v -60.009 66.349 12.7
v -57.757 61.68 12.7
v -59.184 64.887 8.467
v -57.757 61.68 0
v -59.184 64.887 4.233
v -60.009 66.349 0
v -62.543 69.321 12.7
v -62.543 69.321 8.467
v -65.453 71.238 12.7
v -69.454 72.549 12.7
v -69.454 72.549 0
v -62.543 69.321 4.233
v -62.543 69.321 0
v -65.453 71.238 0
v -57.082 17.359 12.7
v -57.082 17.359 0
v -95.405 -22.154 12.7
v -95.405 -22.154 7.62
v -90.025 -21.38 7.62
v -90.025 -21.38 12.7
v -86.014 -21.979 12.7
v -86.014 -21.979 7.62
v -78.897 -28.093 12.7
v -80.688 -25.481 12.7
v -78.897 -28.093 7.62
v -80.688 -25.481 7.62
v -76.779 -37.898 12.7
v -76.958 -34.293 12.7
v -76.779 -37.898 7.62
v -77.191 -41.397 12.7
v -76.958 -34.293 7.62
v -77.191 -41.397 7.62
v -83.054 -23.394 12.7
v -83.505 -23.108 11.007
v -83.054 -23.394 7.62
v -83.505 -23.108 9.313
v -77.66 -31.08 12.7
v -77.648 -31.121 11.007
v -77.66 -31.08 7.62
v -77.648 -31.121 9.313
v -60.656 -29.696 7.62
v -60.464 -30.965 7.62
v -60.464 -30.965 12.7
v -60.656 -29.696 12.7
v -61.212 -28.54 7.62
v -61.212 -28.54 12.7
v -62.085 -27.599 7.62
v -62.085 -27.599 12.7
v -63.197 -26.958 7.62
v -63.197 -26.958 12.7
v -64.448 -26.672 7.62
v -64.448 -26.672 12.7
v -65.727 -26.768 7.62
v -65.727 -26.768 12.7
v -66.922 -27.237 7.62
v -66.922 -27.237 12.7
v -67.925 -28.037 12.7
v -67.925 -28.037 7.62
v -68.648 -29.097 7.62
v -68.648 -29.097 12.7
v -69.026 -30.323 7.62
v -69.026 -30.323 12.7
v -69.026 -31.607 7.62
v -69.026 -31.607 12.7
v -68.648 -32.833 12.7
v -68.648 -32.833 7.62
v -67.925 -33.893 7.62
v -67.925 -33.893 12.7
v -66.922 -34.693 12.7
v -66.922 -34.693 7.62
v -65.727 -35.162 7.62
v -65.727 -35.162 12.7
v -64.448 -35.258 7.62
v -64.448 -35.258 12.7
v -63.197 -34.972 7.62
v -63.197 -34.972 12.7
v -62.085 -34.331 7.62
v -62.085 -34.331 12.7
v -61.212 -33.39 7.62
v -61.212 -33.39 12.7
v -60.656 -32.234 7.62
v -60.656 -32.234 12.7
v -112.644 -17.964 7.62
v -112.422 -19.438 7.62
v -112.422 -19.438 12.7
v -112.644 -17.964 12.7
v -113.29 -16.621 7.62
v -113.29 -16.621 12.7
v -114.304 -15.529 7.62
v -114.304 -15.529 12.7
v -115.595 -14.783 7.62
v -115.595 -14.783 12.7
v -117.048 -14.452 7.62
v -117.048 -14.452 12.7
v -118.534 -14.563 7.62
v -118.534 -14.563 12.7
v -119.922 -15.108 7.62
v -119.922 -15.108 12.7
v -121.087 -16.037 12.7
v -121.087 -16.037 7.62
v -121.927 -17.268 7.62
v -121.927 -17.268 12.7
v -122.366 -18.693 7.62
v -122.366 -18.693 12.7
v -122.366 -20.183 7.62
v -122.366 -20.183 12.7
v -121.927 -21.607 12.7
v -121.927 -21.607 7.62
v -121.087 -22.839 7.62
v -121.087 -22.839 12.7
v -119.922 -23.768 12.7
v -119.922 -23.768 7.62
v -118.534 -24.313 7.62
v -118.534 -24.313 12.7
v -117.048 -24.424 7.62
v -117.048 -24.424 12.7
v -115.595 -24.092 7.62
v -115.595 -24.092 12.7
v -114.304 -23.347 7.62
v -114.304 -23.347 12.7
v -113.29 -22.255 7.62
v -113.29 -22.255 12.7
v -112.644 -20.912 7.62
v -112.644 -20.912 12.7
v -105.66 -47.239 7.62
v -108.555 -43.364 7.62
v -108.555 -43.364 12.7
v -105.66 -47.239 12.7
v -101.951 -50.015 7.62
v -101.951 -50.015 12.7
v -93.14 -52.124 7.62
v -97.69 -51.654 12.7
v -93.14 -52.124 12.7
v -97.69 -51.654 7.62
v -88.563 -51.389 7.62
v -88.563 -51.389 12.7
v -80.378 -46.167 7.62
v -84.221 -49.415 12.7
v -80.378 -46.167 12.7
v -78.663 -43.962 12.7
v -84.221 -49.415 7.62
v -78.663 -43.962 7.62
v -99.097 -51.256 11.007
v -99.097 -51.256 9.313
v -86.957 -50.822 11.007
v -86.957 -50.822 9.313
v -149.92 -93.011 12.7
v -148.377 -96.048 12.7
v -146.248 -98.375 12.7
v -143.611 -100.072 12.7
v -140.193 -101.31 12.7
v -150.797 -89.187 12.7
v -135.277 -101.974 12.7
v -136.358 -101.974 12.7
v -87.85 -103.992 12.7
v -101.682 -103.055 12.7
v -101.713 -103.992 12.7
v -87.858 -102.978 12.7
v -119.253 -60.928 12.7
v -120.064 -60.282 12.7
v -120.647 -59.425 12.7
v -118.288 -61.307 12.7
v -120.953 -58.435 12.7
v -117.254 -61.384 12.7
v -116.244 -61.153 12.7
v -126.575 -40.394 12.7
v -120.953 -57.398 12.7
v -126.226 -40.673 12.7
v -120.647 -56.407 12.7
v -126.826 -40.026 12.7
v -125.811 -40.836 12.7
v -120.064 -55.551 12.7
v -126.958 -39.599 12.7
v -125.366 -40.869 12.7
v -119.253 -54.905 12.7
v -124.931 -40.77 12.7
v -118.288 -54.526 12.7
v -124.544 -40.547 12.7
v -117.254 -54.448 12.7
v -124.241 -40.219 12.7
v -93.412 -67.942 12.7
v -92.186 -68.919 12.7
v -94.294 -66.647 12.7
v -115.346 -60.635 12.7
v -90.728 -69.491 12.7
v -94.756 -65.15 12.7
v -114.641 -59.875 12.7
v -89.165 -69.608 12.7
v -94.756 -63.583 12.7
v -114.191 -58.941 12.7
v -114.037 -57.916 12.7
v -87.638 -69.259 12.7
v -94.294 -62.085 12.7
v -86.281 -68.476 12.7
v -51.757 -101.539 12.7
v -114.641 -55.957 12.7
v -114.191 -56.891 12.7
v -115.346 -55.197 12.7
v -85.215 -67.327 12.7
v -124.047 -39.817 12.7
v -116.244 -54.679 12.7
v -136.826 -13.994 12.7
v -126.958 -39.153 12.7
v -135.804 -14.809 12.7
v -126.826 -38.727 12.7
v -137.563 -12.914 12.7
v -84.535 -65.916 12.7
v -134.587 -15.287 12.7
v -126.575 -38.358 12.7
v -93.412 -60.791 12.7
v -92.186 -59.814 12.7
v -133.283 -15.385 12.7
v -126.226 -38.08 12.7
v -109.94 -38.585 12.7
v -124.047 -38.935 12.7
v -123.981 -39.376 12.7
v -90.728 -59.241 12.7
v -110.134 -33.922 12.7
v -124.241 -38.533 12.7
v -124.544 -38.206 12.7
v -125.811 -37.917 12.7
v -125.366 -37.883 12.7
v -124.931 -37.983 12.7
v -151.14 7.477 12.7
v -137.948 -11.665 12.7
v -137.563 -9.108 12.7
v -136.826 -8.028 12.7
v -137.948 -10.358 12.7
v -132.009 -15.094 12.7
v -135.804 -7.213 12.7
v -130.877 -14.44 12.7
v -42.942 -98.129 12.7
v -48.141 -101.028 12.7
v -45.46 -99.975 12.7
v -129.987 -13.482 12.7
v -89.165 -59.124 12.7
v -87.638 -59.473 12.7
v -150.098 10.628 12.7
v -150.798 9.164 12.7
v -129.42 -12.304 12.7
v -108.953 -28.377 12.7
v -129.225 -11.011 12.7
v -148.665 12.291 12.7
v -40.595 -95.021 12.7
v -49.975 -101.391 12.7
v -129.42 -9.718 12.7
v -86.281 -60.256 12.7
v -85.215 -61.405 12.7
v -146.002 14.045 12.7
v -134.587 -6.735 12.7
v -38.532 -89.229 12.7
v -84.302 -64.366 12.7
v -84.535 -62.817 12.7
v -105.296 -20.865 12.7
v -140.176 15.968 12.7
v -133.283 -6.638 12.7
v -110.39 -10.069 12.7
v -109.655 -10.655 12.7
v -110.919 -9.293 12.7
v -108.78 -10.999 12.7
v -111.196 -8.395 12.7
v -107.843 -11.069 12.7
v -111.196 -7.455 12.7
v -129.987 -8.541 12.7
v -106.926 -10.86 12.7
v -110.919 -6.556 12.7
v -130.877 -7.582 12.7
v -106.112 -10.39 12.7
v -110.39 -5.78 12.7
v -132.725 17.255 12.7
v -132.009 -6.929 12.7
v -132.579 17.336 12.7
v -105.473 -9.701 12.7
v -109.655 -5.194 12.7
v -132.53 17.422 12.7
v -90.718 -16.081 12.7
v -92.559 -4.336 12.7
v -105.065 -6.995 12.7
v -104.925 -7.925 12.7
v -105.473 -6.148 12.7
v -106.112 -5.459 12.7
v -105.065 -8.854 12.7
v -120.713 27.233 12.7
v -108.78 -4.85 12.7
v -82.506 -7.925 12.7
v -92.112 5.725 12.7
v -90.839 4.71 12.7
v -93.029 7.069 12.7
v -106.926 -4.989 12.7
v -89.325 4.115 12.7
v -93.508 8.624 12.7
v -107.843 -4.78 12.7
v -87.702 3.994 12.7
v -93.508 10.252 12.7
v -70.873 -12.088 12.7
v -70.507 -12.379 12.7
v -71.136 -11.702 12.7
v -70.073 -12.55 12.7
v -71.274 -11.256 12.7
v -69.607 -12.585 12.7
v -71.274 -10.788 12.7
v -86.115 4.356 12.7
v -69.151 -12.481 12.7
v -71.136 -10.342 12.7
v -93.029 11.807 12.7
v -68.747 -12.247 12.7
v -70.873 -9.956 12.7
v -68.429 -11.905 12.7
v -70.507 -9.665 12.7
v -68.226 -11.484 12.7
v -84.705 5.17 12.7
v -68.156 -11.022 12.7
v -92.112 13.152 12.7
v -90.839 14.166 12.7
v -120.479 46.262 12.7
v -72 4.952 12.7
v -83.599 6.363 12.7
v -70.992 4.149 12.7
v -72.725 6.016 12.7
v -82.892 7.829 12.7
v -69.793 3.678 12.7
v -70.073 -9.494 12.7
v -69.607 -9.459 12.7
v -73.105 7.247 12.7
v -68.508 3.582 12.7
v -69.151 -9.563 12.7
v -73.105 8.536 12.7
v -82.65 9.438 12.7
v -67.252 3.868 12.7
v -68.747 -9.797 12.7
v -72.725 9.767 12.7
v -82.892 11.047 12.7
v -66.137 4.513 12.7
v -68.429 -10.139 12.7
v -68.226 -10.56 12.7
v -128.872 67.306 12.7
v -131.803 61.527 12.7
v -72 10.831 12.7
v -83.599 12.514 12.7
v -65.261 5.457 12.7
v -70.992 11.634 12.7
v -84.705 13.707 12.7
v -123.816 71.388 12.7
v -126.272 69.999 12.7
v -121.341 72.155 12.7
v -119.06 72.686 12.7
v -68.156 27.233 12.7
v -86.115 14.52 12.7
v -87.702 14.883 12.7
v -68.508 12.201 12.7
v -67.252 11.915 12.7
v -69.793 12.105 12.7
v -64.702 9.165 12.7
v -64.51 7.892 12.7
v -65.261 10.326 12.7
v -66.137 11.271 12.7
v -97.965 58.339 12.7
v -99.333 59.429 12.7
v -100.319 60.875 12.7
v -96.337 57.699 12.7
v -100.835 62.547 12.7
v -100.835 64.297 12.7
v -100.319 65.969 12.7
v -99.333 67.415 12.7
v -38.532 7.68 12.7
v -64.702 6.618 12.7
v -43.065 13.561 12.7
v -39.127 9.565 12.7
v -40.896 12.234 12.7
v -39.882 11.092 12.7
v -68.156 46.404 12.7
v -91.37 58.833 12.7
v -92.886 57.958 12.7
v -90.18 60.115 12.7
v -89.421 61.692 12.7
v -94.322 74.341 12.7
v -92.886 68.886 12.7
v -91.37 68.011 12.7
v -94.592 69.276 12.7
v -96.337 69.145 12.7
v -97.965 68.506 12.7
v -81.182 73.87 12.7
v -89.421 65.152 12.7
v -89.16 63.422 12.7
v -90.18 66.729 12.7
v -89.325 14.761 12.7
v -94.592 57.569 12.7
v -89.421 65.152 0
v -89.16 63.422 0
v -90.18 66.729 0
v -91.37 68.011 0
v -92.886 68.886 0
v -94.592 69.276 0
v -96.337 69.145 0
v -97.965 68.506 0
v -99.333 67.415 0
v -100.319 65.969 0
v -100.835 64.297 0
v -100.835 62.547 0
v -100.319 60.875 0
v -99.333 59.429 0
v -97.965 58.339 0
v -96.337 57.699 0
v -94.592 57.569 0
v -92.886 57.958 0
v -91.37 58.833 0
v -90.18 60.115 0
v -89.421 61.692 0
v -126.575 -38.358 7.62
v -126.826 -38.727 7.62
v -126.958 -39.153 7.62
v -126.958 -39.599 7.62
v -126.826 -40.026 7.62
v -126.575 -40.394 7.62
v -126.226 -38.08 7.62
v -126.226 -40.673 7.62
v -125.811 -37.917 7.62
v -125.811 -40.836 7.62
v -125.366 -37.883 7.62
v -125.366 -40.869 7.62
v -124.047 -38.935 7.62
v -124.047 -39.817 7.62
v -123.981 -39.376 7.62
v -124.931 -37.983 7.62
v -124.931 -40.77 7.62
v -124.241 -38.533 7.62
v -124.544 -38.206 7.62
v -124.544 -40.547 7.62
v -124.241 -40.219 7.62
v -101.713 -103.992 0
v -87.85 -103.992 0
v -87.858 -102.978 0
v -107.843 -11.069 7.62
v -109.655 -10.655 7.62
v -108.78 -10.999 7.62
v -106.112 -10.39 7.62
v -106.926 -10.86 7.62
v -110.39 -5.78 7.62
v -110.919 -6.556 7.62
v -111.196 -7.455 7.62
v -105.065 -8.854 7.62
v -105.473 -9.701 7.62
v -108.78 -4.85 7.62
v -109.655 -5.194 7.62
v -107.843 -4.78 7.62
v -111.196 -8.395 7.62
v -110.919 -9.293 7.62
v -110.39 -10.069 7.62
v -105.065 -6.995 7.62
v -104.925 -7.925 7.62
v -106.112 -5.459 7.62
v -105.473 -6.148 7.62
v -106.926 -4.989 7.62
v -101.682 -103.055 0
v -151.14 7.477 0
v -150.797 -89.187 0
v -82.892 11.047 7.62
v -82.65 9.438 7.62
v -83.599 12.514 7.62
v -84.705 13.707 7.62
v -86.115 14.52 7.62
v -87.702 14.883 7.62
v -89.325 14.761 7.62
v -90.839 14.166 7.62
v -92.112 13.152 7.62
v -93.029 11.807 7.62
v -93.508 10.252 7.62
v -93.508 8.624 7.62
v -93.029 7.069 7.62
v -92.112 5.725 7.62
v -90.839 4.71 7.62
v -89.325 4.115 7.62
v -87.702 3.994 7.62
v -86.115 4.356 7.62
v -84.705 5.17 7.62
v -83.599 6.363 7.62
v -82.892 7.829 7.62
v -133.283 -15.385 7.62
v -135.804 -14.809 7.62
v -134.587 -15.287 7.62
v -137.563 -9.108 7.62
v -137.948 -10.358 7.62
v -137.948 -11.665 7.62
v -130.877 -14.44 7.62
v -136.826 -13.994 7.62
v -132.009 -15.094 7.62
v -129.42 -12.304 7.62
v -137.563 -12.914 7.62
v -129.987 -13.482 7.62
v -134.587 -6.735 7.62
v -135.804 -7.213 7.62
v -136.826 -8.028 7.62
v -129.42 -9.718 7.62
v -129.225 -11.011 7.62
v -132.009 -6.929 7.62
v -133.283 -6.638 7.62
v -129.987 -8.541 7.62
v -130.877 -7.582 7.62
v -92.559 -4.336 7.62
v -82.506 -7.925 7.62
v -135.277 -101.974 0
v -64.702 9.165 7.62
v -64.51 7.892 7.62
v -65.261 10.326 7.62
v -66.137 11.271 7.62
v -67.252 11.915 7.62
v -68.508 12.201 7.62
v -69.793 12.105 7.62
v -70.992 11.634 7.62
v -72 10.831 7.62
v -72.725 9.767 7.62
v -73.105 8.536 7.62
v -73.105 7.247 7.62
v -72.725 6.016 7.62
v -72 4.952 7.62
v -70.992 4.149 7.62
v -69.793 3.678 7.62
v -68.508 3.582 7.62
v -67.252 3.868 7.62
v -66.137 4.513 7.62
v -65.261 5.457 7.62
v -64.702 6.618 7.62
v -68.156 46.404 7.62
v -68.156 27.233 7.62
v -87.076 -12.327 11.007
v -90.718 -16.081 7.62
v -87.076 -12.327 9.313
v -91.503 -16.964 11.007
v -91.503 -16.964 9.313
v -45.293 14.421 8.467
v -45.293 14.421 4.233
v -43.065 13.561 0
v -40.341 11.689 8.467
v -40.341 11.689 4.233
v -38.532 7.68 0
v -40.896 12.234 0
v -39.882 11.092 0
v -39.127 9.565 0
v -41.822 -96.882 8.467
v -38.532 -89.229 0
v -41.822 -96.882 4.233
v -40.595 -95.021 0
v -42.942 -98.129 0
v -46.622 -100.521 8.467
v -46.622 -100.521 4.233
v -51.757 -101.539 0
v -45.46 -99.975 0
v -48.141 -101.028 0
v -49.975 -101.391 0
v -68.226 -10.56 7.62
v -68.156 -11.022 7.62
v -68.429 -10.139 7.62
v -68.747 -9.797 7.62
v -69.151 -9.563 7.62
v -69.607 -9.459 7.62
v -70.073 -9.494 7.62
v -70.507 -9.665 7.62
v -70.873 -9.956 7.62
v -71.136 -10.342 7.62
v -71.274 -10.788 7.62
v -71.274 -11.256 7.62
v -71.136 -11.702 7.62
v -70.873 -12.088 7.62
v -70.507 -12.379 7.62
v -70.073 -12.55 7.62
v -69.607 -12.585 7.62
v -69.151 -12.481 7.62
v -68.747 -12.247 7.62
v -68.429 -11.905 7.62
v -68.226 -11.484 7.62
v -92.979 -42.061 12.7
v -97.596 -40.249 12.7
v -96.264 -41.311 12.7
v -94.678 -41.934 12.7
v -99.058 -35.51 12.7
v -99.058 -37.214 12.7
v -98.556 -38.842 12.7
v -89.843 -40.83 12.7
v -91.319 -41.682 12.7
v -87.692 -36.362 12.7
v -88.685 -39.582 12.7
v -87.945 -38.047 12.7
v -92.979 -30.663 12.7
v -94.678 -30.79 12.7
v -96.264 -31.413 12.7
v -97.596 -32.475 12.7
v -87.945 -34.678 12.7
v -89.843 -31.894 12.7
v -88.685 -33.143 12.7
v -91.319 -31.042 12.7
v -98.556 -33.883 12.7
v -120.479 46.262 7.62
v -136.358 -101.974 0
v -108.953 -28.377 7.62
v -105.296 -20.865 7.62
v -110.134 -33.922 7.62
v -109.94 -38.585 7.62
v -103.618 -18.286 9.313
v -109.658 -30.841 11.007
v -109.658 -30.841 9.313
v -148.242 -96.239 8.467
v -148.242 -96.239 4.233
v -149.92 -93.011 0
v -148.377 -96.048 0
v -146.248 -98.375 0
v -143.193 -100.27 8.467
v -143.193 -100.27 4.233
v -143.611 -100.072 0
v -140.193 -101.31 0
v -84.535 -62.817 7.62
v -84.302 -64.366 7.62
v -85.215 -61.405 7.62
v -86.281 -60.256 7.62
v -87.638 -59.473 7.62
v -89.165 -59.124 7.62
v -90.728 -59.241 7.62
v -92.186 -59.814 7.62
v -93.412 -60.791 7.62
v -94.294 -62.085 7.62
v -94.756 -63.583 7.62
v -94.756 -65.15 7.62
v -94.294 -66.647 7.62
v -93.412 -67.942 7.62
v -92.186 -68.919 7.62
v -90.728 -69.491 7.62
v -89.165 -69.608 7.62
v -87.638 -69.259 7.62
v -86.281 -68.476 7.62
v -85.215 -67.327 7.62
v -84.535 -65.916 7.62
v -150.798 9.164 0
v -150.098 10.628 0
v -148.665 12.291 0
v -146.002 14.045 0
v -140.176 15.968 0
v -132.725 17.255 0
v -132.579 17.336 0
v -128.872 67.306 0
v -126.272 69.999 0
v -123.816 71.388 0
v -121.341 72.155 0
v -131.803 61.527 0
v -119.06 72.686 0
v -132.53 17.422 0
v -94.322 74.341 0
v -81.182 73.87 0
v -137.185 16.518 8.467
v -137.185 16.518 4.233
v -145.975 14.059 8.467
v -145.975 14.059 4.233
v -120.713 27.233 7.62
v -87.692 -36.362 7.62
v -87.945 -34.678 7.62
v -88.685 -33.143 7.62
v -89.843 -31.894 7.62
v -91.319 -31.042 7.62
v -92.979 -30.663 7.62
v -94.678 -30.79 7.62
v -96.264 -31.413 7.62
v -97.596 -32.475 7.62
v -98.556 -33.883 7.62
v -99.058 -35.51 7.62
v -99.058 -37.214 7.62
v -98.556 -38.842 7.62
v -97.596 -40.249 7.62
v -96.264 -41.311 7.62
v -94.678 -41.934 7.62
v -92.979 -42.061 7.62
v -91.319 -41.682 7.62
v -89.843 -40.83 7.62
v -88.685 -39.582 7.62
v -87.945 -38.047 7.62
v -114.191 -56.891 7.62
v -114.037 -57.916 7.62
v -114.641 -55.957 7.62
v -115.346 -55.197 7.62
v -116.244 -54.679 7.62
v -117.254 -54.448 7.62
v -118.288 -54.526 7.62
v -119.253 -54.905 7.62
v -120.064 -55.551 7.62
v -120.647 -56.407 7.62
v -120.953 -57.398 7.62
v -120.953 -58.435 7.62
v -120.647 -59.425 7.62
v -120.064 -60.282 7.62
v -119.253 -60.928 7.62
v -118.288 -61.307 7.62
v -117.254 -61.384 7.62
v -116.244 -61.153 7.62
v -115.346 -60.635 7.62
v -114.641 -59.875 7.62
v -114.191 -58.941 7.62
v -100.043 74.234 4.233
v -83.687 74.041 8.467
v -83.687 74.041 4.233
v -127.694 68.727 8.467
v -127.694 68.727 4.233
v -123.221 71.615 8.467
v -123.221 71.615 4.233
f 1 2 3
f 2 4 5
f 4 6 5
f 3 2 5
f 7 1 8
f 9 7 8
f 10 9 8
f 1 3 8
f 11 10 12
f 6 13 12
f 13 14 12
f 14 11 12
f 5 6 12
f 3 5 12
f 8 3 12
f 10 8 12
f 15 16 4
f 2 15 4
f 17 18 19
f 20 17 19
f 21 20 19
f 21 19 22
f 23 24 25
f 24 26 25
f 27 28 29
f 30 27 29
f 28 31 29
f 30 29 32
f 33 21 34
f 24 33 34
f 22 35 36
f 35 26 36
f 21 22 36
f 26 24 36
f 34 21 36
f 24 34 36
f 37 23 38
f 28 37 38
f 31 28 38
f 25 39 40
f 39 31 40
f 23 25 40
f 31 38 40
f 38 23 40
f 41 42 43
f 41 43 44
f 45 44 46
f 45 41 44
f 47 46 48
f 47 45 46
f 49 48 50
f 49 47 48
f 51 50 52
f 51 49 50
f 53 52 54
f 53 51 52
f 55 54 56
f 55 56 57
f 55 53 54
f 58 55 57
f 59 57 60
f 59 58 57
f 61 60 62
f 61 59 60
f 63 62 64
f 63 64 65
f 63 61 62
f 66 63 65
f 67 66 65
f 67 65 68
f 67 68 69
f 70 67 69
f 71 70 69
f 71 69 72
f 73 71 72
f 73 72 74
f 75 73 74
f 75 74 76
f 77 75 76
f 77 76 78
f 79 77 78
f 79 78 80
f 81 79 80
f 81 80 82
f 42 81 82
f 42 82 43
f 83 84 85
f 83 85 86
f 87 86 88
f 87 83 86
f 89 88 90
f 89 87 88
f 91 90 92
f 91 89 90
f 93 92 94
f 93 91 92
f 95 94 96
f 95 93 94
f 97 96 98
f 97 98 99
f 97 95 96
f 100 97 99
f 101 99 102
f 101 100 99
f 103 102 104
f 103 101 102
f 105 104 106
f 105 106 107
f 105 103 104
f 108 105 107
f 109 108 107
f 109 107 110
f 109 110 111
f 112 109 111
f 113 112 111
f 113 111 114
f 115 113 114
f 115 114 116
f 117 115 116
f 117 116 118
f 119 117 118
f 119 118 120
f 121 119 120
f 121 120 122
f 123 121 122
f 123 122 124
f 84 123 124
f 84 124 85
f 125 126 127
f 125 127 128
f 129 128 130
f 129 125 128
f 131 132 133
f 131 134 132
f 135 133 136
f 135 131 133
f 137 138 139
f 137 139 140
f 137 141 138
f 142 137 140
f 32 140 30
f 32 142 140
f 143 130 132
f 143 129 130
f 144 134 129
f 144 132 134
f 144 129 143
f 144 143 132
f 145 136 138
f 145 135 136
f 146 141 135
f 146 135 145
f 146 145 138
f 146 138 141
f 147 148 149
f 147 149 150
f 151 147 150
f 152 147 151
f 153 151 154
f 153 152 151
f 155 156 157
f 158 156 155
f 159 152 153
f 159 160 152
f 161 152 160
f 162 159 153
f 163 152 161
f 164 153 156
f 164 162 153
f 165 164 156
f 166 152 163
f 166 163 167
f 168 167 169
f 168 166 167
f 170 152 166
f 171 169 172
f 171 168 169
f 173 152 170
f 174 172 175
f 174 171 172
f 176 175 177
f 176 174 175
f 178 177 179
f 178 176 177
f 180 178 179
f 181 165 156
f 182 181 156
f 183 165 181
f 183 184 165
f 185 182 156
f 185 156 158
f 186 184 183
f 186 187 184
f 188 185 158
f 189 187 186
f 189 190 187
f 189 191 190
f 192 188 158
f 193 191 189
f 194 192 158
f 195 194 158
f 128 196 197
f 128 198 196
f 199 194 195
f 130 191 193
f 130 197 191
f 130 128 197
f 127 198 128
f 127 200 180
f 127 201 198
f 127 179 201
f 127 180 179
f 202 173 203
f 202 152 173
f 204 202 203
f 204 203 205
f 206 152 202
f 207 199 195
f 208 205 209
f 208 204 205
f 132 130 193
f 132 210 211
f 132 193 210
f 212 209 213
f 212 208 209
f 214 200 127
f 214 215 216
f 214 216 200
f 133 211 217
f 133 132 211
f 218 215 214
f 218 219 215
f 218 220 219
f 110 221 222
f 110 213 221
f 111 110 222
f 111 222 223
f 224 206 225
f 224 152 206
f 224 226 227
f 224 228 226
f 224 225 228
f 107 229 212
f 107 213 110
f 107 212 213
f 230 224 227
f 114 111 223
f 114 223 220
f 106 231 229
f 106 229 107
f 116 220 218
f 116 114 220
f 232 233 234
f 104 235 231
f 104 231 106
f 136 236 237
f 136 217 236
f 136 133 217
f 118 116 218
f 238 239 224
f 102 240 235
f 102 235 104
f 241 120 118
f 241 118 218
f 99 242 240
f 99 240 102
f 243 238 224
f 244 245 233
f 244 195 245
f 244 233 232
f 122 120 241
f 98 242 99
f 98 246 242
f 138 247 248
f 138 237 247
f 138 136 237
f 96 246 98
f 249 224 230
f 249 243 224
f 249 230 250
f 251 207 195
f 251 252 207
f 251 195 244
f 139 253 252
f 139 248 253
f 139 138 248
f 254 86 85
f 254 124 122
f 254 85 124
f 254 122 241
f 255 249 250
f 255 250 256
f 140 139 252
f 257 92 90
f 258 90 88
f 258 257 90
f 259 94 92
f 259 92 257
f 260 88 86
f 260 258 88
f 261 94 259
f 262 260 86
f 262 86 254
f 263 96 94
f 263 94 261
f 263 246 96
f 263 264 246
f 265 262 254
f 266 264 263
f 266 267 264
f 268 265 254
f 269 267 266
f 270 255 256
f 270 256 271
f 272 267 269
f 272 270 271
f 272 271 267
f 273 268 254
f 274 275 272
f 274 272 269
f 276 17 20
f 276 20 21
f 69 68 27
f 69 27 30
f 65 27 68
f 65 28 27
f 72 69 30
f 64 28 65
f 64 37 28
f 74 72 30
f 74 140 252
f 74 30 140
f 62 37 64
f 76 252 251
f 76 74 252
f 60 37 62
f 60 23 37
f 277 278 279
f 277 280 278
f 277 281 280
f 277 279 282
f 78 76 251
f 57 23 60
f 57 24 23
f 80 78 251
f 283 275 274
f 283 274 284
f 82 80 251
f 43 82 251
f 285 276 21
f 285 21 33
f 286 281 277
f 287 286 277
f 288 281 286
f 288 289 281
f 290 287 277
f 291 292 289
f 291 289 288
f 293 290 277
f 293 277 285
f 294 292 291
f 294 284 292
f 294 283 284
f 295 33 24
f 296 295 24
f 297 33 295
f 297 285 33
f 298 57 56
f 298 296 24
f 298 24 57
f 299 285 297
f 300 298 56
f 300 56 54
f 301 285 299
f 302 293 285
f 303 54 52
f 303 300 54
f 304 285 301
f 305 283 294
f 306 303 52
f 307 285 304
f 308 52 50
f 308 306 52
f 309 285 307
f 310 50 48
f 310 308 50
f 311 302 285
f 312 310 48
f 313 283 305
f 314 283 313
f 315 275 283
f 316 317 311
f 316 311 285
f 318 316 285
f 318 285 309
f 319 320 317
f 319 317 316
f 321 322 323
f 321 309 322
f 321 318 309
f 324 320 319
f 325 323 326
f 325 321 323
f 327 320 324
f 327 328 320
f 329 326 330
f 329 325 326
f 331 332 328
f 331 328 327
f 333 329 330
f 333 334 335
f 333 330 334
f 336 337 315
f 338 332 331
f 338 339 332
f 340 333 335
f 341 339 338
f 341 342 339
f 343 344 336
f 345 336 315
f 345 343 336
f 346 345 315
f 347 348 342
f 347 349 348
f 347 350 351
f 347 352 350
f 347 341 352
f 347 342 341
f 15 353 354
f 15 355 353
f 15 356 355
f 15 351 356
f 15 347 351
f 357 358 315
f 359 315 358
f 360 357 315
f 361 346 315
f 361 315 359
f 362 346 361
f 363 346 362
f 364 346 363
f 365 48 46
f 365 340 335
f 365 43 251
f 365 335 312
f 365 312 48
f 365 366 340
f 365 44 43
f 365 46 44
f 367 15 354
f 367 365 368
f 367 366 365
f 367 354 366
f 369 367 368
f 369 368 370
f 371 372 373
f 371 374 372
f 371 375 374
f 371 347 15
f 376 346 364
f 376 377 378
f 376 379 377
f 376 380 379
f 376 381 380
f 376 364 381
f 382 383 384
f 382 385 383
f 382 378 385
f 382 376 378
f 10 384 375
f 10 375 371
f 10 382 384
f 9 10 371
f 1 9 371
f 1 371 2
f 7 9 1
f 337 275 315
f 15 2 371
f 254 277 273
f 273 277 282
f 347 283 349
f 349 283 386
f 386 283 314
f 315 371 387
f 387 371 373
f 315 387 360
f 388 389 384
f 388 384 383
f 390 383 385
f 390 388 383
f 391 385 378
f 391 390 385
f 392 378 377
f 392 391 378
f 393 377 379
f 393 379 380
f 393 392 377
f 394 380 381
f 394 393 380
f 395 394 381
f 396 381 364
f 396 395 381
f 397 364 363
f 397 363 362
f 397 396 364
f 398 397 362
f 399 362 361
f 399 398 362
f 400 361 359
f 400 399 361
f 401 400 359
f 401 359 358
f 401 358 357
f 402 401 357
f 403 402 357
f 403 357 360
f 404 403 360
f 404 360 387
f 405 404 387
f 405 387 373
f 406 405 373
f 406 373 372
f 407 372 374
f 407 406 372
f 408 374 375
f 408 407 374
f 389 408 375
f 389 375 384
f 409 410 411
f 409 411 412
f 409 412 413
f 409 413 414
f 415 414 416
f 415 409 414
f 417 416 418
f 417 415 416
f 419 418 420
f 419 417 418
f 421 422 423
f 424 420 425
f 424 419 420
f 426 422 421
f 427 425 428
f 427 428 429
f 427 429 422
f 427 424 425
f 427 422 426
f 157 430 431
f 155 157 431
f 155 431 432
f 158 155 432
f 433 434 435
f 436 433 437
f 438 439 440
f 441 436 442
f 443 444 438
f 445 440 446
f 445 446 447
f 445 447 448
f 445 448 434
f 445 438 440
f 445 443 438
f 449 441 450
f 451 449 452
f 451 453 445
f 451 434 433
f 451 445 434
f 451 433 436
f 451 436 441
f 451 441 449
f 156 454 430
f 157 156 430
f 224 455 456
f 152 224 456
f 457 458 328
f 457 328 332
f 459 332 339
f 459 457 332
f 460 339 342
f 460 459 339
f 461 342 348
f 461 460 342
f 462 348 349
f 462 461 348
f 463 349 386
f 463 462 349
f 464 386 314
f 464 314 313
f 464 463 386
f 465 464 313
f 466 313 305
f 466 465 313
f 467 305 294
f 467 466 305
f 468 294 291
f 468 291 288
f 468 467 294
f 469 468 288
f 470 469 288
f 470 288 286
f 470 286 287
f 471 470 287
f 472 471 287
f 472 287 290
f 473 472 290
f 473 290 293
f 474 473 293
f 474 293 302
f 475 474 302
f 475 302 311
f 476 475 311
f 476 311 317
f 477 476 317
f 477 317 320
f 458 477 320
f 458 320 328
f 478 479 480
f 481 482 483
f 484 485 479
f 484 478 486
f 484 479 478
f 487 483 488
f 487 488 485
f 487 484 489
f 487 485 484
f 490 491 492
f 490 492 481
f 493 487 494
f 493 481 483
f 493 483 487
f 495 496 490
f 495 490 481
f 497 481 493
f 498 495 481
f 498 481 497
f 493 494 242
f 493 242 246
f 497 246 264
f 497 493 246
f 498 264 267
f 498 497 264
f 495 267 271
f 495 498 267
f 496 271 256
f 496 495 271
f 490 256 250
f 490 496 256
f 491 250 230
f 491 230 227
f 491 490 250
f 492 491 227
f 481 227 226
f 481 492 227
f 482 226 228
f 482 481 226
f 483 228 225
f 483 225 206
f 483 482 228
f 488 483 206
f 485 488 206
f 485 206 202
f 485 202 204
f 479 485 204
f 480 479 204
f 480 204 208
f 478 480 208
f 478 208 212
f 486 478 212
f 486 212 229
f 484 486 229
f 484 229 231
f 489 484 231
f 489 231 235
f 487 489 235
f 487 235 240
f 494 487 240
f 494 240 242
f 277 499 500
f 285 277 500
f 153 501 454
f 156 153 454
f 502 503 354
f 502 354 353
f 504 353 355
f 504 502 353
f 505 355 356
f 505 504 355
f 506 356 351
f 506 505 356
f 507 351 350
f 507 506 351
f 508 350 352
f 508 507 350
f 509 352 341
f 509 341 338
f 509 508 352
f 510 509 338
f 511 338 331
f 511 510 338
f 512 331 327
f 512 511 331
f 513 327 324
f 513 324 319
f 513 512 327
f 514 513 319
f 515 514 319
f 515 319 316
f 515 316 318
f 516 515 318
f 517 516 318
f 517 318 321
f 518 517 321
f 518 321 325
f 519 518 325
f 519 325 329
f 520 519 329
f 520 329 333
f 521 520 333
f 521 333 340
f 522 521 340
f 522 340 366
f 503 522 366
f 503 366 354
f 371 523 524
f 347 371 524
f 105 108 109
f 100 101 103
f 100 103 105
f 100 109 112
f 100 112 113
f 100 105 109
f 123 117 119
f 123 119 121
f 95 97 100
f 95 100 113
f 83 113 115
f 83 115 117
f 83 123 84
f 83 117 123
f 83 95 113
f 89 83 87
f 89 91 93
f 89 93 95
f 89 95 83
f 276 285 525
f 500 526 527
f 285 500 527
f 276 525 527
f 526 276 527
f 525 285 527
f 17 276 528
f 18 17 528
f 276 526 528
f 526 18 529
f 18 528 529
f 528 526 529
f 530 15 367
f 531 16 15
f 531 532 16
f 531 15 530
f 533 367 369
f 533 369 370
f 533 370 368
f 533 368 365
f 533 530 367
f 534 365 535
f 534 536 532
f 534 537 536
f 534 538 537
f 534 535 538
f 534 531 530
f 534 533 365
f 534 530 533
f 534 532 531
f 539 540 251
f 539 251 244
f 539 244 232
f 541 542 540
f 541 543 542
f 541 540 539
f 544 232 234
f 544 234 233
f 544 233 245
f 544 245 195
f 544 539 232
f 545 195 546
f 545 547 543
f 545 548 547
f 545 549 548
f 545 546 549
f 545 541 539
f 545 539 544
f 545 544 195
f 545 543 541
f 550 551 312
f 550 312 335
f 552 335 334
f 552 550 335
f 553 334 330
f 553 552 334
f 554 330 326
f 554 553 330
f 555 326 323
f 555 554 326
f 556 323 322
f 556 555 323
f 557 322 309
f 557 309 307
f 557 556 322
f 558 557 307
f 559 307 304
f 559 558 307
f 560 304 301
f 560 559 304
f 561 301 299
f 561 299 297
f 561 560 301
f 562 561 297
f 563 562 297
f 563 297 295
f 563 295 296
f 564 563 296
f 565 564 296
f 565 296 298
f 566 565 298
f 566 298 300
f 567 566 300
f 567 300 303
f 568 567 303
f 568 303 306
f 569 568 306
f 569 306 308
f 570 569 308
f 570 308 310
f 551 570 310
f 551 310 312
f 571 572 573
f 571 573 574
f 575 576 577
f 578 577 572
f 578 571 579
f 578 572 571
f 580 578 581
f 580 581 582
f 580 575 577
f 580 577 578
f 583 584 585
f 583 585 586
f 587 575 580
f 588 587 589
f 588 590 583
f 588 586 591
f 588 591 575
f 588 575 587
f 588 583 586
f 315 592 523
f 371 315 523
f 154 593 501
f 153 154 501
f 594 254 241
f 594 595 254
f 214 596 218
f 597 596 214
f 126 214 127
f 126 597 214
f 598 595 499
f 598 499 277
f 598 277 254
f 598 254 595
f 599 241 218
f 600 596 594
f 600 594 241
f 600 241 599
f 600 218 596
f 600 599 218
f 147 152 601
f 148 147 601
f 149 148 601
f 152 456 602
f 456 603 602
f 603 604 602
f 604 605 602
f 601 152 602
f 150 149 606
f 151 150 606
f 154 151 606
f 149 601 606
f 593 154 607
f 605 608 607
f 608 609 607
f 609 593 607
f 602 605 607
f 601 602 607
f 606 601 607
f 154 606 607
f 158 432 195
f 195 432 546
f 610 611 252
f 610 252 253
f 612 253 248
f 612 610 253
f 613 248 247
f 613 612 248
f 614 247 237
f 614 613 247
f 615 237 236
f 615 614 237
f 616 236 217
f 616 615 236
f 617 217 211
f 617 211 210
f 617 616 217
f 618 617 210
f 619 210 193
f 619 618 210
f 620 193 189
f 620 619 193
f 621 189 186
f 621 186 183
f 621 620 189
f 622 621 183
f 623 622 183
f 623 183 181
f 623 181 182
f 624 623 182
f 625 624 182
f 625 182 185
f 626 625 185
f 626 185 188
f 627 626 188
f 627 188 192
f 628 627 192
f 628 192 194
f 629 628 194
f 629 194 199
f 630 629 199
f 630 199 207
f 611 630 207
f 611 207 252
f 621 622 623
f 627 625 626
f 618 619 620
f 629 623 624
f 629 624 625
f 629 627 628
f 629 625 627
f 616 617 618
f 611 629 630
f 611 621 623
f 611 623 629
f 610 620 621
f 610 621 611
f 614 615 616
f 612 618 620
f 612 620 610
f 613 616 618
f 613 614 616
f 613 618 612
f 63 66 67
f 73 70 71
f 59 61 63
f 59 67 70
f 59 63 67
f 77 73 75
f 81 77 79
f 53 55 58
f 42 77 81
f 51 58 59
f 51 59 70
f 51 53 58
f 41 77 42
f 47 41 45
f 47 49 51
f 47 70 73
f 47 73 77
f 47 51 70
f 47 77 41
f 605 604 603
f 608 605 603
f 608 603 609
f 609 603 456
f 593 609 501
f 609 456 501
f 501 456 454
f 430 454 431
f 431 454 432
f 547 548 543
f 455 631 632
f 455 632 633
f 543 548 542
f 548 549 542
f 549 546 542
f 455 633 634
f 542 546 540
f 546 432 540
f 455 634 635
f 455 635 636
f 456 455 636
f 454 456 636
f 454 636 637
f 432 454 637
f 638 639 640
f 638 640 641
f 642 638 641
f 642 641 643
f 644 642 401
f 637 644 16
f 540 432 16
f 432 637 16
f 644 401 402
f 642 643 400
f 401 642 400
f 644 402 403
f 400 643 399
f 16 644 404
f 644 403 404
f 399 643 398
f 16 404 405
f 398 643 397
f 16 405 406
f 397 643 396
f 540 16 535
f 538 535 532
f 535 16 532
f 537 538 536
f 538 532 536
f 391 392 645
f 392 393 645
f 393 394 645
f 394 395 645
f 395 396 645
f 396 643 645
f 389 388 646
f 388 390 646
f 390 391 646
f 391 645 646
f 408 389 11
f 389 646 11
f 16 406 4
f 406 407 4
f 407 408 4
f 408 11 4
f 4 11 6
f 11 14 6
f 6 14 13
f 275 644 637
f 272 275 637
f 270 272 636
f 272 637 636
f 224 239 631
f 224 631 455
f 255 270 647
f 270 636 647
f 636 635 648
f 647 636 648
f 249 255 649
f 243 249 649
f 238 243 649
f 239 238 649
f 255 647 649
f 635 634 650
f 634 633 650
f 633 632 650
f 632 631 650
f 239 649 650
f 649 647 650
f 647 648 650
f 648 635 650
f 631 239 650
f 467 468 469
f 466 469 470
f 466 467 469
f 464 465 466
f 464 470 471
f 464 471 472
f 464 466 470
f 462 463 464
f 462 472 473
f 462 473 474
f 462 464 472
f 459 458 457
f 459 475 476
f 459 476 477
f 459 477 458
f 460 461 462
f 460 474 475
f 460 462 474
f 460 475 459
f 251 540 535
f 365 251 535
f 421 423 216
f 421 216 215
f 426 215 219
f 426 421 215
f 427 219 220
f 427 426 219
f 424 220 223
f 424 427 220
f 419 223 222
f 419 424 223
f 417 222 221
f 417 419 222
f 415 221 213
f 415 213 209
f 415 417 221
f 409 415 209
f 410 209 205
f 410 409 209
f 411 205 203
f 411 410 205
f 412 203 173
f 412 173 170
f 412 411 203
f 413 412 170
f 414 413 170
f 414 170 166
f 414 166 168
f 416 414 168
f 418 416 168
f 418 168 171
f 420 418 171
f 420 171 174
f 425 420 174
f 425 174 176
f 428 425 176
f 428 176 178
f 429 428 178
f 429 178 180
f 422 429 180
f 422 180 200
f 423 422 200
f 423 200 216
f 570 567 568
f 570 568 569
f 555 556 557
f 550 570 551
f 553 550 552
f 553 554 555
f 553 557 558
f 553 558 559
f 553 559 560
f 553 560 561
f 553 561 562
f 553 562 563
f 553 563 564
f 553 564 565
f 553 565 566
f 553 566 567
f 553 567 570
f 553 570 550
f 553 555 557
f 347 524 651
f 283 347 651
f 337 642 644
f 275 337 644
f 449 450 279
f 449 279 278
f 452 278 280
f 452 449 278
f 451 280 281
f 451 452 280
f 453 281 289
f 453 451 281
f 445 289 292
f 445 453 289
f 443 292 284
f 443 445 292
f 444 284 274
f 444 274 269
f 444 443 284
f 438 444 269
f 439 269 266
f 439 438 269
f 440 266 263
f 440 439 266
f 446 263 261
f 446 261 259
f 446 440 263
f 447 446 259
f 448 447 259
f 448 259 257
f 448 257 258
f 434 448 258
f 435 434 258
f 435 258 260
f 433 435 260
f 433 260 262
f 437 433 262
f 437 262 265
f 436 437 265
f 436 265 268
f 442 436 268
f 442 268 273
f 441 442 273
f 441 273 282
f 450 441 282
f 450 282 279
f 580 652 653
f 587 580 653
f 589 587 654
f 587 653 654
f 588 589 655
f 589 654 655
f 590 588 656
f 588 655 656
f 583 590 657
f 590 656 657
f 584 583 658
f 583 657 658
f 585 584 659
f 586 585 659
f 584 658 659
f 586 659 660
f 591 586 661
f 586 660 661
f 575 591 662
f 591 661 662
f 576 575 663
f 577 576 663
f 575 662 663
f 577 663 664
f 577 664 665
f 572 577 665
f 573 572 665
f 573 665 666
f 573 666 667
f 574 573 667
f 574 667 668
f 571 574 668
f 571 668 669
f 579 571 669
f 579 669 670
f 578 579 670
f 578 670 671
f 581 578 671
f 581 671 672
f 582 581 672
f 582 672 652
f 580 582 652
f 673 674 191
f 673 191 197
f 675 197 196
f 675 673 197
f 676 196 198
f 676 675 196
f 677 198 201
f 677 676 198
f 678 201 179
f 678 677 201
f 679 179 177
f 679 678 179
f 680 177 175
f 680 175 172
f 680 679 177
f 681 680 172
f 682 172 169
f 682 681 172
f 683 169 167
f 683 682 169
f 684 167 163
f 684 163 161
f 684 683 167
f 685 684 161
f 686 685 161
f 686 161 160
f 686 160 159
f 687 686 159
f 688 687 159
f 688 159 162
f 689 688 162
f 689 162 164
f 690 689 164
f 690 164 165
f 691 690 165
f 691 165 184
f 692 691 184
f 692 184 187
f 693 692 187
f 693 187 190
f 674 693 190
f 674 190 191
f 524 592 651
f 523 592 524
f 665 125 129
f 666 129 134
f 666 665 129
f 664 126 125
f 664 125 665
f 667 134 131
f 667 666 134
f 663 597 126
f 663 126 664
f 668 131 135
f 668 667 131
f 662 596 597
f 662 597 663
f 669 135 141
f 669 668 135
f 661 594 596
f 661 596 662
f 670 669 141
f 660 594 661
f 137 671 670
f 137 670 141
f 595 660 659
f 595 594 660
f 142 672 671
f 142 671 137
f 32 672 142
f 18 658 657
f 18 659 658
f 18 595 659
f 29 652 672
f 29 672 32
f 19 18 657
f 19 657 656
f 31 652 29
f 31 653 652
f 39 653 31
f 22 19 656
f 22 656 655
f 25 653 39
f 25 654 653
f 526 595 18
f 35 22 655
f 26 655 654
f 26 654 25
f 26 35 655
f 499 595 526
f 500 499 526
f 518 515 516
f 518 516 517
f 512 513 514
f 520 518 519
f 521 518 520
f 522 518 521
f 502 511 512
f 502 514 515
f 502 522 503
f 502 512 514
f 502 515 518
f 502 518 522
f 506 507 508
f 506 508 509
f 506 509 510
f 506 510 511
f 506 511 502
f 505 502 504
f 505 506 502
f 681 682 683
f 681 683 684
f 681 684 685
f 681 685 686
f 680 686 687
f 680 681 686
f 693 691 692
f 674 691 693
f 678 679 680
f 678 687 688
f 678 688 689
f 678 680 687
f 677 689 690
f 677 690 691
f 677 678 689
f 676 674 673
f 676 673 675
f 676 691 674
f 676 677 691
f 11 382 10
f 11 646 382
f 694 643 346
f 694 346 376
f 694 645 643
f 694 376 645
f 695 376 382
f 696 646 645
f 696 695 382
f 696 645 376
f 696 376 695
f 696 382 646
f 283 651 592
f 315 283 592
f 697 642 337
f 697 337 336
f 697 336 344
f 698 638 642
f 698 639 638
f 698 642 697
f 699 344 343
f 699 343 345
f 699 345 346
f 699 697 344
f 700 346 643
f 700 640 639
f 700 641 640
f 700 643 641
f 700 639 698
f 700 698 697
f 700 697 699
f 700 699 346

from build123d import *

# Parameters (mm, degrees)
F0_R     = 1.496924
F0_R_2   = 3.477607
F0_R_3   = 5.000213
F0_R_4   = 5.256627
F0_R_5   = 4.304855
F0_R_6   = 4.385843
F0_R_7   = 3.153201
F0_R_8   = 5.870011
F0_R_9   = 1.567334
F0_R_10  = 4.321853
F0_R_11  = 5.459754
F1_DEPTH = 12.7
F0_R_12  = 7.190762
F0_R_13  = 5.715
F2_DEPTH = 7.62
F3_DEPTH = 12.7


with BuildPart() as f1:
    # F0 (on Top) → F1 (new body)
    with BuildSketch(Plane.XY):
        with BuildLine():
            Line((-131.803075, 61.526629), (-132.53006, 17.42161))
            add(Edge.make_bspline(
                [(-132.53006, 17.42161), (-132.53006, 16.438883), (-150.375057, 16.976569), (-151.139576, 7.47687)],
                knots=[0, 0, 0, 0, 21.100047, 21.100047, 21.100047, 21.100047], degree=3))
            Line((-151.139576, 7.47687), (-150.796539, -89.187486))
            add(Edge.make_bspline(
                [(-150.796539, -89.187486), (-149.725936, -97.980395), (-143.849122, -101.201955), (-136.357958, -101.974052)],
                knots=[0, 0, 0, 0, 19.286496, 19.286496, 19.286496, 19.286496], degree=3))
            Line((-136.357958, -101.974052), (-135.276752, -101.974052))
            Line((-135.276752, -101.974052), (-101.682383, -103.054997))
            Line((-101.682383, -103.054997), (-101.712527, -103.991822))
            Line((-101.712527, -103.991822), (-87.849766, -103.991822))
            Line((-87.849766, -103.991822), (-87.858493, -102.977792))
            Line((-87.858493, -102.977792), (-51.757253, -101.539352))
            add(Edge.make_bspline(
                [(-38.531929, -89.229472), (-40.675483, -99.353819), (-46.844892, -101.366516), (-51.757253, -101.539352)],
                knots=[0, 0, 0, 0, 18.067715, 18.067715, 18.067715, 18.067715], degree=3))
            Line((-38.531929, -89.229472), (-38.531929, 7.680066))
            add(Edge.make_bspline(
                [(-57.082368, 17.358589), (-40.642904, 13.823552), (-40.001379, 12.821936), (-38.531929, 7.680066)],
                knots=[0, 0, 0, 0, 20.923494, 20.923494, 20.923494, 20.923494], degree=3))
            Line((-57.082368, 17.358589), (-57.757391, 61.679844))
            add(Edge.make_bspline(
                [(-57.757391, 61.679844), (-58.758005, 63.463514), (-60.22691, 70.734918), (-69.454086, 72.549358)],
                knots=[0, 0, 0, 0, 15.967435, 15.967435, 15.967435, 15.967435], degree=3))
            add(Edge.make_bspline(
                [(-119.06031, 72.685671), (-98.531029, 75.251681), (-82.806464, 74.541935), (-69.454086, 72.549358)],
                knots=[0, 0, 0, 0, 49.606411, 49.606411, 49.606411, 49.606411], degree=3))
            add(Edge.make_bspline(
                [(-131.803075, 61.526629), (-128.101333, 71.713794), (-122.839052, 71.691977), (-119.06031, 72.685671)],
                knots=[0, 0, 0, 0, 16.93819, 16.93819, 16.93819, 16.93819], degree=3))
        make_face()
        with Locations((-125.477582, -39.376188)):
            Circle(F0_R, mode=Mode.SUBTRACT)
        with Locations((-117.514238, -57.91628)):
            Circle(F0_R_2, mode=Mode.SUBTRACT)
        with Locations((-117.421836, -19.4379)):
            Circle(F0_R_3, mode=Mode.SUBTRACT)
        with BuildLine():
            add(Edge.make_bspline(
                [(-92.559412, -2.722392), (-99.928118, -11.216616), (-120.820127, -30.964935), (-108.078144, -47.028057)],
                knots=[0, 0, 0, 0, 46.944894, 46.944894, 46.944894, 46.944894], degree=3))
            Line((-92.559412, -2.722392), (-79.016782, -7.556637))
            add(Edge.make_bspline(
                [(-79.016782, -7.556637), (-83.614662, -11.021999), (-88.109598, -15.379434), (-91.712408, -19.805491)],
                knots=[0, 0, 0, 0, 17.64124, 17.64124, 17.64124, 17.64124], degree=3))
            add(Edge.make_bspline(
                [(-91.712408, -19.805491), (-71.812876, -19.32627), (-73.281839, -42.991612), (-78.178406, -46.745423)],
                knots=[0, 0, 0, 0, 30.148452, 30.148452, 30.148452, 30.148452], degree=3))
            add(Edge.make_bspline(
                [(-108.078144, -47.028057), (-100.131333, -56.782793), (-82.993366, -54.98749), (-78.178406, -46.745423)],
                knots=[0, 0, 0, 0, 29.901075, 29.901075, 29.901075, 29.901075], degree=3))
        make_face(mode=Mode.SUBTRACT)
        with Locations((-89.558132, -64.366221)):
            Circle(F0_R_4, mode=Mode.SUBTRACT)
        with Locations((-64.769246, -30.964935)):
            Circle(F0_R_5, mode=Mode.SUBTRACT)
        with Locations((-133.611128, -11.011187)):
            Circle(F0_R_6, mode=Mode.SUBTRACT)
        with Locations((-108.078144, -7.924549)):
            Circle(F0_R_7, mode=Mode.SUBTRACT)
        with Locations((-95.0303, 63.422114)):
            Circle(F0_R_8, mode=Mode.SUBTRACT)
        with Locations((-69.72374, -11.021999)):
            Circle(F0_R_9, mode=Mode.SUBTRACT)
        with Locations((-68.831384, 7.891561)):
            Circle(F0_R_10, mode=Mode.SUBTRACT)
        with Locations((-88.109598, 9.438152)):
            Circle(F0_R_11, mode=Mode.SUBTRACT)
        Polygon((-127.203408, 20.682184), (-127.325644, 52.755584), (-61.360919, 52.755584), (-61.360919, 20.682184), align=None, mode=Mode.SUBTRACT)
        with BuildLine():
            Line((-79.016782, -7.556637), (-92.559412, -2.722392))
            add(Edge.make_bspline(
                [(-92.559412, -2.722392), (-99.928118, -11.216616), (-120.820127, -30.964935), (-108.078144, -47.028057)],
                knots=[0, 0, 0, 0, 46.944894, 46.944894, 46.944894, 46.944894], degree=3))
            add(Edge.make_bspline(
                [(-108.078144, -47.028057), (-100.131333, -56.782793), (-82.993366, -54.98749), (-78.178406, -46.745423)],
                knots=[0, 0, 0, 0, 29.901075, 29.901075, 29.901075, 29.901075], degree=3))
            add(Edge.make_bspline(
                [(-91.712408, -19.805491), (-71.812876, -19.32627), (-73.281839, -42.991612), (-78.178406, -46.745423)],
                knots=[0, 0, 0, 0, 30.148452, 30.148452, 30.148452, 30.148452], degree=3))
            add(Edge.make_bspline(
                [(-79.016782, -7.556637), (-83.614662, -11.021999), (-88.109598, -15.379434), (-91.712408, -19.805491)],
                knots=[0, 0, 0, 0, 17.64124, 17.64124, 17.64124, 17.64124], degree=3))
        make_face()
        with BuildLine():
            add(Edge.make_bspline(
                [(-92.559412, -4.335725), (-105.420828, -19.4379), (-113.935962, -30.403955), (-108.555153, -43.363504)],
                knots=[0, 0, 0, 0, 42.178564, 42.178564, 42.178564, 42.178564], degree=3))
            Line((-92.559412, -4.335725), (-82.505698, -7.924549))
            add(Edge.make_bspline(
                [(-82.505698, -7.924549), (-87.019771, -12.31665), (-91.893606, -16.58126), (-95.404953, -22.153838)],
                knots=[0, 0, 0, 0, 19.205817, 19.205817, 19.205817, 19.205817], degree=3))
            add(Edge.make_bspline(
                [(-95.404953, -22.153838), (-80.268763, -17.979054), (-75.162396, -31.588022), (-77.190861, -41.397225)],
                knots=[0, 0, 0, 0, 26.496436, 26.496436, 26.496436, 26.496436], degree=3))
            add(Edge.make_bspline(
                [(-108.555153, -43.363504), (-102.122009, -55.195887), (-84.086247, -55.540521), (-77.190861, -41.397225)],
                knots=[0, 0, 0, 0, 31.425866, 31.425866, 31.425866, 31.425866], degree=3))
        make_face(mode=Mode.SUBTRACT)
        Polygon((-61.360919, 52.755584), (-127.325644, 52.755584), (-127.203408, 20.682184), (-61.360919, 20.682184), align=None)
        Polygon((-67.204248, 26.135962), (-121.871863, 26.135962), (-121.612164, 47.301807), (-67.204248, 47.301807), align=None, mode=Mode.SUBTRACT)
        Polygon((-121.612164, 47.301807), (-121.871863, 26.135962), (-67.204248, 26.135962), (-67.204248, 47.301807), align=None)
        Polygon((-68.156406, 27.233338), (-120.712638, 27.233338), (-120.479164, 46.26181), (-68.156406, 46.403773), align=None, mode=Mode.SUBTRACT)
    extrude(amount=F1_DEPTH)

    # F0 (on Top) → F2 (join)
    with BuildSketch(Plane.XY):
        with Locations((-88.109598, 9.438152)):
            Circle(F0_R_11)
        with Locations((-68.831384, 7.891561)):
            Circle(F0_R_10)
        with Locations((-69.72374, -11.021999)):
            Circle(F0_R_9)
        with Locations((-64.769246, -30.964935)):
            Circle(F0_R_5)
        with Locations((-108.078144, -7.924549)):
            Circle(F0_R_7)
        with Locations((-117.421836, -19.4379)):
            Circle(F0_R_3)
        with Locations((-133.611128, -11.011187)):
            Circle(F0_R_6)
        with Locations((-125.477582, -39.376188)):
            Circle(F0_R)
        with Locations((-117.514238, -57.91628)):
            Circle(F0_R_2)
        with Locations((-89.558132, -64.366221)):
            Circle(F0_R_4)
        with BuildLine():
            Line((-82.505698, -7.924549), (-92.559412, -4.335725))
            add(Edge.make_bspline(
                [(-92.559412, -4.335725), (-105.420828, -19.4379), (-113.935962, -30.403955), (-108.555153, -43.363504)],
                knots=[0, 0, 0, 0, 42.178564, 42.178564, 42.178564, 42.178564], degree=3))
            add(Edge.make_bspline(
                [(-108.555153, -43.363504), (-102.122009, -55.195887), (-84.086247, -55.540521), (-77.190861, -41.397225)],
                knots=[0, 0, 0, 0, 31.425866, 31.425866, 31.425866, 31.425866], degree=3))
            add(Edge.make_bspline(
                [(-95.404953, -22.153838), (-80.268763, -17.979054), (-75.162396, -31.588022), (-77.190861, -41.397225)],
                knots=[0, 0, 0, 0, 26.496436, 26.496436, 26.496436, 26.496436], degree=3))
            add(Edge.make_bspline(
                [(-82.505698, -7.924549), (-87.019771, -12.31665), (-91.893606, -16.58126), (-95.404953, -22.153838)],
                knots=[0, 0, 0, 0, 19.205817, 19.205817, 19.205817, 19.205817], degree=3))
        make_face()
        with Locations((-93.40658, -36.362156)):
            Circle(F0_R_12, mode=Mode.SUBTRACT)
        Polygon((-120.479164, 46.26181), (-120.712638, 27.233338), (-68.156406, 27.233338), (-68.156406, 46.403773), align=None)
        with Locations((-93.40658, -36.362156)):
            Circle(F0_R_13)
        with Locations((-93.40658, -36.362156)):
            Circle(F0_R_12)
        with Locations((-93.40658, -36.362156)):
            Circle(F0_R_13, mode=Mode.SUBTRACT)
    extrude(amount=F2_DEPTH)

    # F0 (on Top) → F3 (join)
    with BuildSketch(Plane.XY):
        with Locations((-93.40658, -36.362156)):
            Circle(F0_R_13)
    extrude(amount=F3_DEPTH)


solid = f1.part
